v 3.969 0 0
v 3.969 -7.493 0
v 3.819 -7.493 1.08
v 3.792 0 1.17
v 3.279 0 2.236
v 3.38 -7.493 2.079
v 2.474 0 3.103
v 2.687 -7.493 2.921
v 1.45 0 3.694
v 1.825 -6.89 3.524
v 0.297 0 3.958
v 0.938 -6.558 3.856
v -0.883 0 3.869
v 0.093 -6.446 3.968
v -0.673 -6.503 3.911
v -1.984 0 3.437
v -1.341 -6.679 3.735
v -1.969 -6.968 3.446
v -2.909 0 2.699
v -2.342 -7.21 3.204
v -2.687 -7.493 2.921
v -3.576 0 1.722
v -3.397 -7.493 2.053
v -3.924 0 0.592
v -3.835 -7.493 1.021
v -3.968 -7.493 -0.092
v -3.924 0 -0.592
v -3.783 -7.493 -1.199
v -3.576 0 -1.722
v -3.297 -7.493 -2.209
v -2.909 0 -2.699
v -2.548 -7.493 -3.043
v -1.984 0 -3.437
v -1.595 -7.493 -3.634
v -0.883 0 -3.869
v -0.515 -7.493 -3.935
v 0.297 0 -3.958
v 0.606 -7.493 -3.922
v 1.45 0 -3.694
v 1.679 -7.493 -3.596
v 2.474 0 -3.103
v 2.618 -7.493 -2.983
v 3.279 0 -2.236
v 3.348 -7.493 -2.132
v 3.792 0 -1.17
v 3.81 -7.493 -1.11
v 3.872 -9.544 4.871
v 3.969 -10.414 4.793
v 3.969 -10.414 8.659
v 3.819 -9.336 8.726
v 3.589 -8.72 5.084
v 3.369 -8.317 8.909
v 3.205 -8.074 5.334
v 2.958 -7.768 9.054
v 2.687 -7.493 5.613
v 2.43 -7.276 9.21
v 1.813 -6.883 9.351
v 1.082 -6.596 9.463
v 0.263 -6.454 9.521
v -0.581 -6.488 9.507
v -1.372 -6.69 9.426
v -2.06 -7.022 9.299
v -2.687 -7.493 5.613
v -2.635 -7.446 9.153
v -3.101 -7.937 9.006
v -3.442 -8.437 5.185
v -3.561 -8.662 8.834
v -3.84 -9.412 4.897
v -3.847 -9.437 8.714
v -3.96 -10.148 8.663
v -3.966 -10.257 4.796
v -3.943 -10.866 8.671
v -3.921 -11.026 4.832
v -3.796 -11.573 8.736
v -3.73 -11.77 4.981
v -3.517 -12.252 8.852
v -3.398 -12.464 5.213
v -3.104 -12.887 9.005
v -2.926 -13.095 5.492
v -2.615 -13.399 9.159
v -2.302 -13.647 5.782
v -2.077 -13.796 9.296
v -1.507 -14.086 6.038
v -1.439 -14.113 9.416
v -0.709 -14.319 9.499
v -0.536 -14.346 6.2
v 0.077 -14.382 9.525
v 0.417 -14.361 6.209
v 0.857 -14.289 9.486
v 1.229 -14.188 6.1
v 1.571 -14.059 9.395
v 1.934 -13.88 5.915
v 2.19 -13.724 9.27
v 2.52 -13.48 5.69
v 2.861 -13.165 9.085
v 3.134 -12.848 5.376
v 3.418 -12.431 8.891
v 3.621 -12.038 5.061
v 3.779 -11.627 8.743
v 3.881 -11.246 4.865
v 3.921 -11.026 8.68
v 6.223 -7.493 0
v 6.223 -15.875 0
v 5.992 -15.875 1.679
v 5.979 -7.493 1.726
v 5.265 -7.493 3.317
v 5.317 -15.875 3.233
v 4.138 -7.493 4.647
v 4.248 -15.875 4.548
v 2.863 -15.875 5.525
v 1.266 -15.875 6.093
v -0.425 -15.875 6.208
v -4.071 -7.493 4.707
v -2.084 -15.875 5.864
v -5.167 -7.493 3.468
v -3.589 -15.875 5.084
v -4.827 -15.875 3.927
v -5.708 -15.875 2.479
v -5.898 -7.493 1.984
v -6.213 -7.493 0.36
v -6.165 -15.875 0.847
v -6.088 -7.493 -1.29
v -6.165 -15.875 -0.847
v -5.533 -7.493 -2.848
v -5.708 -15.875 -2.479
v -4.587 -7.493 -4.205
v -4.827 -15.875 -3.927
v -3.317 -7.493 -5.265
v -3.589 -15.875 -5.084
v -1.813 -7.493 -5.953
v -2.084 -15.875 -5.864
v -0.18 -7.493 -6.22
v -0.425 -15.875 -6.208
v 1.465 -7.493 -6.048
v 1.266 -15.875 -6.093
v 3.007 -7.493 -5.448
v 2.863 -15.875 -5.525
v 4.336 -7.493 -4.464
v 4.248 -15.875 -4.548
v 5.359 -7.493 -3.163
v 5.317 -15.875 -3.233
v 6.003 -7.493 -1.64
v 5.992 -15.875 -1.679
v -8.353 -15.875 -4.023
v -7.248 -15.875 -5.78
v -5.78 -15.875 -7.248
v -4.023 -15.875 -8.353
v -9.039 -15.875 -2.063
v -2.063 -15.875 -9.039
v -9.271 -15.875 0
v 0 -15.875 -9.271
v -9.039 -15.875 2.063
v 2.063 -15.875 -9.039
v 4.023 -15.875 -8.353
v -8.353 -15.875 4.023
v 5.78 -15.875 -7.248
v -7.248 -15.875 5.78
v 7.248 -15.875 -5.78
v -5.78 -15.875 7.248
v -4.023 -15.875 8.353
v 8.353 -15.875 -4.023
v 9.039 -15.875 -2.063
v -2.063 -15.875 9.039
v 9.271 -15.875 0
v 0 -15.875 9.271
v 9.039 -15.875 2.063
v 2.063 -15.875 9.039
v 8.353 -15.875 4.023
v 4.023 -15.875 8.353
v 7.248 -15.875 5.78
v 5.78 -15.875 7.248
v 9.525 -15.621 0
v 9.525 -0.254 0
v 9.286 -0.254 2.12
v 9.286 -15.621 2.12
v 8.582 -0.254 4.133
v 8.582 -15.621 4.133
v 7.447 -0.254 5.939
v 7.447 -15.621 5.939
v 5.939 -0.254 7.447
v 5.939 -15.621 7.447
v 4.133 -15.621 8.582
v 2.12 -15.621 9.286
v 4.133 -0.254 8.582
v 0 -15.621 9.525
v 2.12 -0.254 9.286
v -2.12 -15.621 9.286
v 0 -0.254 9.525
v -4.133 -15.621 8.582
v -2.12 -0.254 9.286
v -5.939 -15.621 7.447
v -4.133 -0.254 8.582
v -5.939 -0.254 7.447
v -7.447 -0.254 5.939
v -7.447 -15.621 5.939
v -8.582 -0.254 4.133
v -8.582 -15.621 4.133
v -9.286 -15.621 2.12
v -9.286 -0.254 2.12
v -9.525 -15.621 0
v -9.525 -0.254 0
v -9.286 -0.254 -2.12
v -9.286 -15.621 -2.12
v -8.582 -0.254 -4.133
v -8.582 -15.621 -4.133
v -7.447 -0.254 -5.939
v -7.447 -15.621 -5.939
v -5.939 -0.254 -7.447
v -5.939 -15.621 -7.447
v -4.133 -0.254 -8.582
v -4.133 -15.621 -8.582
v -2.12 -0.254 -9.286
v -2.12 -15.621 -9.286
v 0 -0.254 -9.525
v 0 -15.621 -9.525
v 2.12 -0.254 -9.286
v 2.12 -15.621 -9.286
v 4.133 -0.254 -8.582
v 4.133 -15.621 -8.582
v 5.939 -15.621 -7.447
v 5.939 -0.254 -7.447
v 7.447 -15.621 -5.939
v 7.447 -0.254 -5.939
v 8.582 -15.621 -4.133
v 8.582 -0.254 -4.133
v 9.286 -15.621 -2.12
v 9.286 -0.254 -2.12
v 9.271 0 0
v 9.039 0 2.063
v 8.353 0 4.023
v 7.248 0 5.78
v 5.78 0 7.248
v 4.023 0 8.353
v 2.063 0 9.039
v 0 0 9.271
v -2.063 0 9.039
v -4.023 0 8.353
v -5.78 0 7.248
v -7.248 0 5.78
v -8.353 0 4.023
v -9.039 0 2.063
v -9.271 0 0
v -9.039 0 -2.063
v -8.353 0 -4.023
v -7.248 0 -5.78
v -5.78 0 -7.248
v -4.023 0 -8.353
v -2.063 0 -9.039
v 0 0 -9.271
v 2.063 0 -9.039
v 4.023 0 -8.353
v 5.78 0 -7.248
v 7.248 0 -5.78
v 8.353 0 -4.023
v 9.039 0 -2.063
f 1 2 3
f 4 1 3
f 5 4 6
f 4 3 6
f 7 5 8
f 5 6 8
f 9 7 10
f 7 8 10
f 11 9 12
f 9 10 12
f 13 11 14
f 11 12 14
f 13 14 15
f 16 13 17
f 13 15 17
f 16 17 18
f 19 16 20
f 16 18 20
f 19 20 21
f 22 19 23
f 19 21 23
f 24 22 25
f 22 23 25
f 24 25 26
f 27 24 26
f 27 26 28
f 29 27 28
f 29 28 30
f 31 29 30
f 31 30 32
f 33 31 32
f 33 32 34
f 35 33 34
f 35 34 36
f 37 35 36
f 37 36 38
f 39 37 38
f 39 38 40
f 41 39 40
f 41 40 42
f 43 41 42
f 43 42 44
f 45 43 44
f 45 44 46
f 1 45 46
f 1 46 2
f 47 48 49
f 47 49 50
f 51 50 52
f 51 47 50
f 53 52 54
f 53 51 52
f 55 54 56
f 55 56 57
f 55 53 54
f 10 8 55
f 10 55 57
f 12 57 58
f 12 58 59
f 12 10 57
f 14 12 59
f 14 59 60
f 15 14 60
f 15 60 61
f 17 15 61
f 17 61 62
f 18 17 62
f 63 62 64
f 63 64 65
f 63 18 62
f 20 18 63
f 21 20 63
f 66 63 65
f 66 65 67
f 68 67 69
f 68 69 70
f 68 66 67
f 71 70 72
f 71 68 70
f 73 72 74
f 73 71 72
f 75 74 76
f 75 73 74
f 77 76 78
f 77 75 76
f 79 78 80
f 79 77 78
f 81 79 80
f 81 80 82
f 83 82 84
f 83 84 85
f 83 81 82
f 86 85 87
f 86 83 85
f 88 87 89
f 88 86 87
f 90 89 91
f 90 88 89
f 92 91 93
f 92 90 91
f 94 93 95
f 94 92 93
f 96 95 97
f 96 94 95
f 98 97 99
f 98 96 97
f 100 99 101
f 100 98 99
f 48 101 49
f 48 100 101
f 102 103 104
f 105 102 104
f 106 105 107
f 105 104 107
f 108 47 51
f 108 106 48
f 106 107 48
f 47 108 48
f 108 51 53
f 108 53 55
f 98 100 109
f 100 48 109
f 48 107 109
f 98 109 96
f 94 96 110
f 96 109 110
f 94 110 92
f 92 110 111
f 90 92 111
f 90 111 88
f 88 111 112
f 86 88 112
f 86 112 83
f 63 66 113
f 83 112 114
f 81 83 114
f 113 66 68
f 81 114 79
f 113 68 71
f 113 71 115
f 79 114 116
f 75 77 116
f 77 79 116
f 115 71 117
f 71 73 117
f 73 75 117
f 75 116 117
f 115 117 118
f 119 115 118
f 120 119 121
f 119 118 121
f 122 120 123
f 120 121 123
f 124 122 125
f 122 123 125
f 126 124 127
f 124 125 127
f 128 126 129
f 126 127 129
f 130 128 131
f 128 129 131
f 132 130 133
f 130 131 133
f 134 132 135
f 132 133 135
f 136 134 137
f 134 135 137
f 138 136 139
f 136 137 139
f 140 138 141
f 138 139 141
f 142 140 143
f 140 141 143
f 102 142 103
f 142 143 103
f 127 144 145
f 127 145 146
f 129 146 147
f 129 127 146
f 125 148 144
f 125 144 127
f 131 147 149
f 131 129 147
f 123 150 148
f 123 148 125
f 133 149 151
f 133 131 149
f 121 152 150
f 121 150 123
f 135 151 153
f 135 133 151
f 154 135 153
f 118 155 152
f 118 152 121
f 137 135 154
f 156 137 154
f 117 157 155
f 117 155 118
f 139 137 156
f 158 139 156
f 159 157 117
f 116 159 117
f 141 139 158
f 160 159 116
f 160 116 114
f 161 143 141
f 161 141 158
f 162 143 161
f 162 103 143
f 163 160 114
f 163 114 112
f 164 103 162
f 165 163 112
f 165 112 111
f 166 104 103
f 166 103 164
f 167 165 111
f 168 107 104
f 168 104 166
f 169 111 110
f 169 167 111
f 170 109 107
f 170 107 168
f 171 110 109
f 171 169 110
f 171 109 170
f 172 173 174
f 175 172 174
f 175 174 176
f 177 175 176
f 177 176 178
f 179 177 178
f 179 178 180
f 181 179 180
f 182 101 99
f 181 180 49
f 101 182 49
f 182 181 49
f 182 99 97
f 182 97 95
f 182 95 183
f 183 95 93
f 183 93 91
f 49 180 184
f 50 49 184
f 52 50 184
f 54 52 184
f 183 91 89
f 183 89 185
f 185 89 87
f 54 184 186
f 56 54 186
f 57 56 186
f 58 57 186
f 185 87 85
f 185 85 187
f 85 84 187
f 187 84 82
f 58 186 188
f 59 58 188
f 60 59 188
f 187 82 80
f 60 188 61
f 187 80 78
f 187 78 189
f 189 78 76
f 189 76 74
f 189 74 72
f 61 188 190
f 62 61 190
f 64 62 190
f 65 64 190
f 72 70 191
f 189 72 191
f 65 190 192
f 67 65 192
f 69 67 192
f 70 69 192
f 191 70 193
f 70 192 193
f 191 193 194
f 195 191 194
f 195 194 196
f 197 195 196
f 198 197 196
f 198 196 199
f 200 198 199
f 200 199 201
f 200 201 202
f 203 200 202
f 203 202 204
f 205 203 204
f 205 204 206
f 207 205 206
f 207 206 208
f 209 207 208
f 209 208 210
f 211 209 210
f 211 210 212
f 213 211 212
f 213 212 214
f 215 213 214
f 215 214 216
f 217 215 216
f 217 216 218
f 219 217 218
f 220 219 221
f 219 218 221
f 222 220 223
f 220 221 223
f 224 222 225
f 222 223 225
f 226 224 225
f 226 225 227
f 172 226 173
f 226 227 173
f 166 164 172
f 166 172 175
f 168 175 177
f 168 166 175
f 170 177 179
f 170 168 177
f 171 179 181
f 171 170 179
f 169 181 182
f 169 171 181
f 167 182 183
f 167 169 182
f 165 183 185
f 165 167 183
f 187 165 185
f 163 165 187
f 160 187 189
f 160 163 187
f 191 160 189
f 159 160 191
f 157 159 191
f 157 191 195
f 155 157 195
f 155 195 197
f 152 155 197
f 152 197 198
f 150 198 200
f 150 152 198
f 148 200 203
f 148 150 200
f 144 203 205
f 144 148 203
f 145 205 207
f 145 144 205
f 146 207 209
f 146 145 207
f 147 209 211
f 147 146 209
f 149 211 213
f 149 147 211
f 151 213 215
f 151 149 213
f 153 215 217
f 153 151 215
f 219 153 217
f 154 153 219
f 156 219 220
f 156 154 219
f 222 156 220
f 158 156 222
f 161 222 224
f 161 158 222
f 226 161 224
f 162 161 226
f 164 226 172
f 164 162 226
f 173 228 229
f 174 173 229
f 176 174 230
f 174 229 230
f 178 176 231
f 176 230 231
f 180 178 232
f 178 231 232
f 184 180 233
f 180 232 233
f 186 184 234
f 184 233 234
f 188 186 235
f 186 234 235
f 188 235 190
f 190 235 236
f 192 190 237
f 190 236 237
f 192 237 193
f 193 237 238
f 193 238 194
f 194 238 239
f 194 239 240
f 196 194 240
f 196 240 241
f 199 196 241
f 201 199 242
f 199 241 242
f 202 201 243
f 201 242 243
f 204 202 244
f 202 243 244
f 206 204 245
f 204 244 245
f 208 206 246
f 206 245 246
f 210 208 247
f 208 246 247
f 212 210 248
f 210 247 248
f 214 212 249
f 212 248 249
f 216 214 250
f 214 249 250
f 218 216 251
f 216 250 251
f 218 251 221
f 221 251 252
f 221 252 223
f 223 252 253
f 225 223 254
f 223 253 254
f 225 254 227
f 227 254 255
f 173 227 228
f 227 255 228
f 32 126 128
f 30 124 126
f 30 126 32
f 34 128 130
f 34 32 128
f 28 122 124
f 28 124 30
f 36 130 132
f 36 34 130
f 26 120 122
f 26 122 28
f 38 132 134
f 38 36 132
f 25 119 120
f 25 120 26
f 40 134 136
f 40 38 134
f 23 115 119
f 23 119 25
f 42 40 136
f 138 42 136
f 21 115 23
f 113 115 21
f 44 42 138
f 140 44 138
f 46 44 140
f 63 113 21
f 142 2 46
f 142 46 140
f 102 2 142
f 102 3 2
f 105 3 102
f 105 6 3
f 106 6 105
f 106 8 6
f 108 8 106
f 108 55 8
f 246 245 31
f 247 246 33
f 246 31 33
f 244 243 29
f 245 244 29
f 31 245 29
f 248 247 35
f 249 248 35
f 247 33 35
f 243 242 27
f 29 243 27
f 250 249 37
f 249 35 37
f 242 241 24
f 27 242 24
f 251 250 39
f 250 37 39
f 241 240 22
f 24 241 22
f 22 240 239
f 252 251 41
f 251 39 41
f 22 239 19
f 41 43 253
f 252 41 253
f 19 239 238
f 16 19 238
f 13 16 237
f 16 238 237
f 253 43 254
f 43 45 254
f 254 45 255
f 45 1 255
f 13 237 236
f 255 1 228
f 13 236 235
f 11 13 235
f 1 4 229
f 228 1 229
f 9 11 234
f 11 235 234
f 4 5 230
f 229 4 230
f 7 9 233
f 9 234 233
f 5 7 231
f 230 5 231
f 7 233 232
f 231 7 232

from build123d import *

# Parameters (mm, degrees)
F0_R     = 9.525
F1_DEPTH = 15.875
F2_R     = 3.96875
F3_DEPTH = 15.876
F4_R     = 6.223
F4_R_2   = 3.96875
F5_DEPTH = 8.382
F6_SIZE  = 0.254
F7_R     = 3.96875
F8_DEPTH = 10.5250001002


with BuildPart() as f1:
    # F0 (on Front) → F1 (new body)
    with BuildSketch(Plane.XZ):
        Circle(F0_R)
    extrude(amount=F1_DEPTH)

    # F2 (on face) → F3 (cut, through all)
    with BuildSketch(Plane.XZ.offset(15.875)):
        Circle(F2_R)
    extrude(amount=-F3_DEPTH, mode=Mode.SUBTRACT)

    # F4 (on face) → F5 (cut)
    with BuildSketch(Plane.XZ.offset(15.875)):
        Circle(F4_R)
        Circle(F4_R_2, mode=Mode.SUBTRACT)
    extrude(amount=-F5_DEPTH, mode=Mode.SUBTRACT)

    # F6
    f6_edges = [f1.edges().sort_by_distance(p)[0] for p in [
        (-9.525, -15.875, 0),
        (-9.525, 0, 0),
    ]]
    chamfer(f6_edges, length=F6_SIZE)

    # F7 (on Top) → F8 (cut, up to face)
    with BuildSketch(Plane.XY):
        with Locations((0, -10.414)):
            Circle(F7_R)
    extrude(amount=F8_DEPTH, mode=Mode.SUBTRACT)


solid = f1.part
